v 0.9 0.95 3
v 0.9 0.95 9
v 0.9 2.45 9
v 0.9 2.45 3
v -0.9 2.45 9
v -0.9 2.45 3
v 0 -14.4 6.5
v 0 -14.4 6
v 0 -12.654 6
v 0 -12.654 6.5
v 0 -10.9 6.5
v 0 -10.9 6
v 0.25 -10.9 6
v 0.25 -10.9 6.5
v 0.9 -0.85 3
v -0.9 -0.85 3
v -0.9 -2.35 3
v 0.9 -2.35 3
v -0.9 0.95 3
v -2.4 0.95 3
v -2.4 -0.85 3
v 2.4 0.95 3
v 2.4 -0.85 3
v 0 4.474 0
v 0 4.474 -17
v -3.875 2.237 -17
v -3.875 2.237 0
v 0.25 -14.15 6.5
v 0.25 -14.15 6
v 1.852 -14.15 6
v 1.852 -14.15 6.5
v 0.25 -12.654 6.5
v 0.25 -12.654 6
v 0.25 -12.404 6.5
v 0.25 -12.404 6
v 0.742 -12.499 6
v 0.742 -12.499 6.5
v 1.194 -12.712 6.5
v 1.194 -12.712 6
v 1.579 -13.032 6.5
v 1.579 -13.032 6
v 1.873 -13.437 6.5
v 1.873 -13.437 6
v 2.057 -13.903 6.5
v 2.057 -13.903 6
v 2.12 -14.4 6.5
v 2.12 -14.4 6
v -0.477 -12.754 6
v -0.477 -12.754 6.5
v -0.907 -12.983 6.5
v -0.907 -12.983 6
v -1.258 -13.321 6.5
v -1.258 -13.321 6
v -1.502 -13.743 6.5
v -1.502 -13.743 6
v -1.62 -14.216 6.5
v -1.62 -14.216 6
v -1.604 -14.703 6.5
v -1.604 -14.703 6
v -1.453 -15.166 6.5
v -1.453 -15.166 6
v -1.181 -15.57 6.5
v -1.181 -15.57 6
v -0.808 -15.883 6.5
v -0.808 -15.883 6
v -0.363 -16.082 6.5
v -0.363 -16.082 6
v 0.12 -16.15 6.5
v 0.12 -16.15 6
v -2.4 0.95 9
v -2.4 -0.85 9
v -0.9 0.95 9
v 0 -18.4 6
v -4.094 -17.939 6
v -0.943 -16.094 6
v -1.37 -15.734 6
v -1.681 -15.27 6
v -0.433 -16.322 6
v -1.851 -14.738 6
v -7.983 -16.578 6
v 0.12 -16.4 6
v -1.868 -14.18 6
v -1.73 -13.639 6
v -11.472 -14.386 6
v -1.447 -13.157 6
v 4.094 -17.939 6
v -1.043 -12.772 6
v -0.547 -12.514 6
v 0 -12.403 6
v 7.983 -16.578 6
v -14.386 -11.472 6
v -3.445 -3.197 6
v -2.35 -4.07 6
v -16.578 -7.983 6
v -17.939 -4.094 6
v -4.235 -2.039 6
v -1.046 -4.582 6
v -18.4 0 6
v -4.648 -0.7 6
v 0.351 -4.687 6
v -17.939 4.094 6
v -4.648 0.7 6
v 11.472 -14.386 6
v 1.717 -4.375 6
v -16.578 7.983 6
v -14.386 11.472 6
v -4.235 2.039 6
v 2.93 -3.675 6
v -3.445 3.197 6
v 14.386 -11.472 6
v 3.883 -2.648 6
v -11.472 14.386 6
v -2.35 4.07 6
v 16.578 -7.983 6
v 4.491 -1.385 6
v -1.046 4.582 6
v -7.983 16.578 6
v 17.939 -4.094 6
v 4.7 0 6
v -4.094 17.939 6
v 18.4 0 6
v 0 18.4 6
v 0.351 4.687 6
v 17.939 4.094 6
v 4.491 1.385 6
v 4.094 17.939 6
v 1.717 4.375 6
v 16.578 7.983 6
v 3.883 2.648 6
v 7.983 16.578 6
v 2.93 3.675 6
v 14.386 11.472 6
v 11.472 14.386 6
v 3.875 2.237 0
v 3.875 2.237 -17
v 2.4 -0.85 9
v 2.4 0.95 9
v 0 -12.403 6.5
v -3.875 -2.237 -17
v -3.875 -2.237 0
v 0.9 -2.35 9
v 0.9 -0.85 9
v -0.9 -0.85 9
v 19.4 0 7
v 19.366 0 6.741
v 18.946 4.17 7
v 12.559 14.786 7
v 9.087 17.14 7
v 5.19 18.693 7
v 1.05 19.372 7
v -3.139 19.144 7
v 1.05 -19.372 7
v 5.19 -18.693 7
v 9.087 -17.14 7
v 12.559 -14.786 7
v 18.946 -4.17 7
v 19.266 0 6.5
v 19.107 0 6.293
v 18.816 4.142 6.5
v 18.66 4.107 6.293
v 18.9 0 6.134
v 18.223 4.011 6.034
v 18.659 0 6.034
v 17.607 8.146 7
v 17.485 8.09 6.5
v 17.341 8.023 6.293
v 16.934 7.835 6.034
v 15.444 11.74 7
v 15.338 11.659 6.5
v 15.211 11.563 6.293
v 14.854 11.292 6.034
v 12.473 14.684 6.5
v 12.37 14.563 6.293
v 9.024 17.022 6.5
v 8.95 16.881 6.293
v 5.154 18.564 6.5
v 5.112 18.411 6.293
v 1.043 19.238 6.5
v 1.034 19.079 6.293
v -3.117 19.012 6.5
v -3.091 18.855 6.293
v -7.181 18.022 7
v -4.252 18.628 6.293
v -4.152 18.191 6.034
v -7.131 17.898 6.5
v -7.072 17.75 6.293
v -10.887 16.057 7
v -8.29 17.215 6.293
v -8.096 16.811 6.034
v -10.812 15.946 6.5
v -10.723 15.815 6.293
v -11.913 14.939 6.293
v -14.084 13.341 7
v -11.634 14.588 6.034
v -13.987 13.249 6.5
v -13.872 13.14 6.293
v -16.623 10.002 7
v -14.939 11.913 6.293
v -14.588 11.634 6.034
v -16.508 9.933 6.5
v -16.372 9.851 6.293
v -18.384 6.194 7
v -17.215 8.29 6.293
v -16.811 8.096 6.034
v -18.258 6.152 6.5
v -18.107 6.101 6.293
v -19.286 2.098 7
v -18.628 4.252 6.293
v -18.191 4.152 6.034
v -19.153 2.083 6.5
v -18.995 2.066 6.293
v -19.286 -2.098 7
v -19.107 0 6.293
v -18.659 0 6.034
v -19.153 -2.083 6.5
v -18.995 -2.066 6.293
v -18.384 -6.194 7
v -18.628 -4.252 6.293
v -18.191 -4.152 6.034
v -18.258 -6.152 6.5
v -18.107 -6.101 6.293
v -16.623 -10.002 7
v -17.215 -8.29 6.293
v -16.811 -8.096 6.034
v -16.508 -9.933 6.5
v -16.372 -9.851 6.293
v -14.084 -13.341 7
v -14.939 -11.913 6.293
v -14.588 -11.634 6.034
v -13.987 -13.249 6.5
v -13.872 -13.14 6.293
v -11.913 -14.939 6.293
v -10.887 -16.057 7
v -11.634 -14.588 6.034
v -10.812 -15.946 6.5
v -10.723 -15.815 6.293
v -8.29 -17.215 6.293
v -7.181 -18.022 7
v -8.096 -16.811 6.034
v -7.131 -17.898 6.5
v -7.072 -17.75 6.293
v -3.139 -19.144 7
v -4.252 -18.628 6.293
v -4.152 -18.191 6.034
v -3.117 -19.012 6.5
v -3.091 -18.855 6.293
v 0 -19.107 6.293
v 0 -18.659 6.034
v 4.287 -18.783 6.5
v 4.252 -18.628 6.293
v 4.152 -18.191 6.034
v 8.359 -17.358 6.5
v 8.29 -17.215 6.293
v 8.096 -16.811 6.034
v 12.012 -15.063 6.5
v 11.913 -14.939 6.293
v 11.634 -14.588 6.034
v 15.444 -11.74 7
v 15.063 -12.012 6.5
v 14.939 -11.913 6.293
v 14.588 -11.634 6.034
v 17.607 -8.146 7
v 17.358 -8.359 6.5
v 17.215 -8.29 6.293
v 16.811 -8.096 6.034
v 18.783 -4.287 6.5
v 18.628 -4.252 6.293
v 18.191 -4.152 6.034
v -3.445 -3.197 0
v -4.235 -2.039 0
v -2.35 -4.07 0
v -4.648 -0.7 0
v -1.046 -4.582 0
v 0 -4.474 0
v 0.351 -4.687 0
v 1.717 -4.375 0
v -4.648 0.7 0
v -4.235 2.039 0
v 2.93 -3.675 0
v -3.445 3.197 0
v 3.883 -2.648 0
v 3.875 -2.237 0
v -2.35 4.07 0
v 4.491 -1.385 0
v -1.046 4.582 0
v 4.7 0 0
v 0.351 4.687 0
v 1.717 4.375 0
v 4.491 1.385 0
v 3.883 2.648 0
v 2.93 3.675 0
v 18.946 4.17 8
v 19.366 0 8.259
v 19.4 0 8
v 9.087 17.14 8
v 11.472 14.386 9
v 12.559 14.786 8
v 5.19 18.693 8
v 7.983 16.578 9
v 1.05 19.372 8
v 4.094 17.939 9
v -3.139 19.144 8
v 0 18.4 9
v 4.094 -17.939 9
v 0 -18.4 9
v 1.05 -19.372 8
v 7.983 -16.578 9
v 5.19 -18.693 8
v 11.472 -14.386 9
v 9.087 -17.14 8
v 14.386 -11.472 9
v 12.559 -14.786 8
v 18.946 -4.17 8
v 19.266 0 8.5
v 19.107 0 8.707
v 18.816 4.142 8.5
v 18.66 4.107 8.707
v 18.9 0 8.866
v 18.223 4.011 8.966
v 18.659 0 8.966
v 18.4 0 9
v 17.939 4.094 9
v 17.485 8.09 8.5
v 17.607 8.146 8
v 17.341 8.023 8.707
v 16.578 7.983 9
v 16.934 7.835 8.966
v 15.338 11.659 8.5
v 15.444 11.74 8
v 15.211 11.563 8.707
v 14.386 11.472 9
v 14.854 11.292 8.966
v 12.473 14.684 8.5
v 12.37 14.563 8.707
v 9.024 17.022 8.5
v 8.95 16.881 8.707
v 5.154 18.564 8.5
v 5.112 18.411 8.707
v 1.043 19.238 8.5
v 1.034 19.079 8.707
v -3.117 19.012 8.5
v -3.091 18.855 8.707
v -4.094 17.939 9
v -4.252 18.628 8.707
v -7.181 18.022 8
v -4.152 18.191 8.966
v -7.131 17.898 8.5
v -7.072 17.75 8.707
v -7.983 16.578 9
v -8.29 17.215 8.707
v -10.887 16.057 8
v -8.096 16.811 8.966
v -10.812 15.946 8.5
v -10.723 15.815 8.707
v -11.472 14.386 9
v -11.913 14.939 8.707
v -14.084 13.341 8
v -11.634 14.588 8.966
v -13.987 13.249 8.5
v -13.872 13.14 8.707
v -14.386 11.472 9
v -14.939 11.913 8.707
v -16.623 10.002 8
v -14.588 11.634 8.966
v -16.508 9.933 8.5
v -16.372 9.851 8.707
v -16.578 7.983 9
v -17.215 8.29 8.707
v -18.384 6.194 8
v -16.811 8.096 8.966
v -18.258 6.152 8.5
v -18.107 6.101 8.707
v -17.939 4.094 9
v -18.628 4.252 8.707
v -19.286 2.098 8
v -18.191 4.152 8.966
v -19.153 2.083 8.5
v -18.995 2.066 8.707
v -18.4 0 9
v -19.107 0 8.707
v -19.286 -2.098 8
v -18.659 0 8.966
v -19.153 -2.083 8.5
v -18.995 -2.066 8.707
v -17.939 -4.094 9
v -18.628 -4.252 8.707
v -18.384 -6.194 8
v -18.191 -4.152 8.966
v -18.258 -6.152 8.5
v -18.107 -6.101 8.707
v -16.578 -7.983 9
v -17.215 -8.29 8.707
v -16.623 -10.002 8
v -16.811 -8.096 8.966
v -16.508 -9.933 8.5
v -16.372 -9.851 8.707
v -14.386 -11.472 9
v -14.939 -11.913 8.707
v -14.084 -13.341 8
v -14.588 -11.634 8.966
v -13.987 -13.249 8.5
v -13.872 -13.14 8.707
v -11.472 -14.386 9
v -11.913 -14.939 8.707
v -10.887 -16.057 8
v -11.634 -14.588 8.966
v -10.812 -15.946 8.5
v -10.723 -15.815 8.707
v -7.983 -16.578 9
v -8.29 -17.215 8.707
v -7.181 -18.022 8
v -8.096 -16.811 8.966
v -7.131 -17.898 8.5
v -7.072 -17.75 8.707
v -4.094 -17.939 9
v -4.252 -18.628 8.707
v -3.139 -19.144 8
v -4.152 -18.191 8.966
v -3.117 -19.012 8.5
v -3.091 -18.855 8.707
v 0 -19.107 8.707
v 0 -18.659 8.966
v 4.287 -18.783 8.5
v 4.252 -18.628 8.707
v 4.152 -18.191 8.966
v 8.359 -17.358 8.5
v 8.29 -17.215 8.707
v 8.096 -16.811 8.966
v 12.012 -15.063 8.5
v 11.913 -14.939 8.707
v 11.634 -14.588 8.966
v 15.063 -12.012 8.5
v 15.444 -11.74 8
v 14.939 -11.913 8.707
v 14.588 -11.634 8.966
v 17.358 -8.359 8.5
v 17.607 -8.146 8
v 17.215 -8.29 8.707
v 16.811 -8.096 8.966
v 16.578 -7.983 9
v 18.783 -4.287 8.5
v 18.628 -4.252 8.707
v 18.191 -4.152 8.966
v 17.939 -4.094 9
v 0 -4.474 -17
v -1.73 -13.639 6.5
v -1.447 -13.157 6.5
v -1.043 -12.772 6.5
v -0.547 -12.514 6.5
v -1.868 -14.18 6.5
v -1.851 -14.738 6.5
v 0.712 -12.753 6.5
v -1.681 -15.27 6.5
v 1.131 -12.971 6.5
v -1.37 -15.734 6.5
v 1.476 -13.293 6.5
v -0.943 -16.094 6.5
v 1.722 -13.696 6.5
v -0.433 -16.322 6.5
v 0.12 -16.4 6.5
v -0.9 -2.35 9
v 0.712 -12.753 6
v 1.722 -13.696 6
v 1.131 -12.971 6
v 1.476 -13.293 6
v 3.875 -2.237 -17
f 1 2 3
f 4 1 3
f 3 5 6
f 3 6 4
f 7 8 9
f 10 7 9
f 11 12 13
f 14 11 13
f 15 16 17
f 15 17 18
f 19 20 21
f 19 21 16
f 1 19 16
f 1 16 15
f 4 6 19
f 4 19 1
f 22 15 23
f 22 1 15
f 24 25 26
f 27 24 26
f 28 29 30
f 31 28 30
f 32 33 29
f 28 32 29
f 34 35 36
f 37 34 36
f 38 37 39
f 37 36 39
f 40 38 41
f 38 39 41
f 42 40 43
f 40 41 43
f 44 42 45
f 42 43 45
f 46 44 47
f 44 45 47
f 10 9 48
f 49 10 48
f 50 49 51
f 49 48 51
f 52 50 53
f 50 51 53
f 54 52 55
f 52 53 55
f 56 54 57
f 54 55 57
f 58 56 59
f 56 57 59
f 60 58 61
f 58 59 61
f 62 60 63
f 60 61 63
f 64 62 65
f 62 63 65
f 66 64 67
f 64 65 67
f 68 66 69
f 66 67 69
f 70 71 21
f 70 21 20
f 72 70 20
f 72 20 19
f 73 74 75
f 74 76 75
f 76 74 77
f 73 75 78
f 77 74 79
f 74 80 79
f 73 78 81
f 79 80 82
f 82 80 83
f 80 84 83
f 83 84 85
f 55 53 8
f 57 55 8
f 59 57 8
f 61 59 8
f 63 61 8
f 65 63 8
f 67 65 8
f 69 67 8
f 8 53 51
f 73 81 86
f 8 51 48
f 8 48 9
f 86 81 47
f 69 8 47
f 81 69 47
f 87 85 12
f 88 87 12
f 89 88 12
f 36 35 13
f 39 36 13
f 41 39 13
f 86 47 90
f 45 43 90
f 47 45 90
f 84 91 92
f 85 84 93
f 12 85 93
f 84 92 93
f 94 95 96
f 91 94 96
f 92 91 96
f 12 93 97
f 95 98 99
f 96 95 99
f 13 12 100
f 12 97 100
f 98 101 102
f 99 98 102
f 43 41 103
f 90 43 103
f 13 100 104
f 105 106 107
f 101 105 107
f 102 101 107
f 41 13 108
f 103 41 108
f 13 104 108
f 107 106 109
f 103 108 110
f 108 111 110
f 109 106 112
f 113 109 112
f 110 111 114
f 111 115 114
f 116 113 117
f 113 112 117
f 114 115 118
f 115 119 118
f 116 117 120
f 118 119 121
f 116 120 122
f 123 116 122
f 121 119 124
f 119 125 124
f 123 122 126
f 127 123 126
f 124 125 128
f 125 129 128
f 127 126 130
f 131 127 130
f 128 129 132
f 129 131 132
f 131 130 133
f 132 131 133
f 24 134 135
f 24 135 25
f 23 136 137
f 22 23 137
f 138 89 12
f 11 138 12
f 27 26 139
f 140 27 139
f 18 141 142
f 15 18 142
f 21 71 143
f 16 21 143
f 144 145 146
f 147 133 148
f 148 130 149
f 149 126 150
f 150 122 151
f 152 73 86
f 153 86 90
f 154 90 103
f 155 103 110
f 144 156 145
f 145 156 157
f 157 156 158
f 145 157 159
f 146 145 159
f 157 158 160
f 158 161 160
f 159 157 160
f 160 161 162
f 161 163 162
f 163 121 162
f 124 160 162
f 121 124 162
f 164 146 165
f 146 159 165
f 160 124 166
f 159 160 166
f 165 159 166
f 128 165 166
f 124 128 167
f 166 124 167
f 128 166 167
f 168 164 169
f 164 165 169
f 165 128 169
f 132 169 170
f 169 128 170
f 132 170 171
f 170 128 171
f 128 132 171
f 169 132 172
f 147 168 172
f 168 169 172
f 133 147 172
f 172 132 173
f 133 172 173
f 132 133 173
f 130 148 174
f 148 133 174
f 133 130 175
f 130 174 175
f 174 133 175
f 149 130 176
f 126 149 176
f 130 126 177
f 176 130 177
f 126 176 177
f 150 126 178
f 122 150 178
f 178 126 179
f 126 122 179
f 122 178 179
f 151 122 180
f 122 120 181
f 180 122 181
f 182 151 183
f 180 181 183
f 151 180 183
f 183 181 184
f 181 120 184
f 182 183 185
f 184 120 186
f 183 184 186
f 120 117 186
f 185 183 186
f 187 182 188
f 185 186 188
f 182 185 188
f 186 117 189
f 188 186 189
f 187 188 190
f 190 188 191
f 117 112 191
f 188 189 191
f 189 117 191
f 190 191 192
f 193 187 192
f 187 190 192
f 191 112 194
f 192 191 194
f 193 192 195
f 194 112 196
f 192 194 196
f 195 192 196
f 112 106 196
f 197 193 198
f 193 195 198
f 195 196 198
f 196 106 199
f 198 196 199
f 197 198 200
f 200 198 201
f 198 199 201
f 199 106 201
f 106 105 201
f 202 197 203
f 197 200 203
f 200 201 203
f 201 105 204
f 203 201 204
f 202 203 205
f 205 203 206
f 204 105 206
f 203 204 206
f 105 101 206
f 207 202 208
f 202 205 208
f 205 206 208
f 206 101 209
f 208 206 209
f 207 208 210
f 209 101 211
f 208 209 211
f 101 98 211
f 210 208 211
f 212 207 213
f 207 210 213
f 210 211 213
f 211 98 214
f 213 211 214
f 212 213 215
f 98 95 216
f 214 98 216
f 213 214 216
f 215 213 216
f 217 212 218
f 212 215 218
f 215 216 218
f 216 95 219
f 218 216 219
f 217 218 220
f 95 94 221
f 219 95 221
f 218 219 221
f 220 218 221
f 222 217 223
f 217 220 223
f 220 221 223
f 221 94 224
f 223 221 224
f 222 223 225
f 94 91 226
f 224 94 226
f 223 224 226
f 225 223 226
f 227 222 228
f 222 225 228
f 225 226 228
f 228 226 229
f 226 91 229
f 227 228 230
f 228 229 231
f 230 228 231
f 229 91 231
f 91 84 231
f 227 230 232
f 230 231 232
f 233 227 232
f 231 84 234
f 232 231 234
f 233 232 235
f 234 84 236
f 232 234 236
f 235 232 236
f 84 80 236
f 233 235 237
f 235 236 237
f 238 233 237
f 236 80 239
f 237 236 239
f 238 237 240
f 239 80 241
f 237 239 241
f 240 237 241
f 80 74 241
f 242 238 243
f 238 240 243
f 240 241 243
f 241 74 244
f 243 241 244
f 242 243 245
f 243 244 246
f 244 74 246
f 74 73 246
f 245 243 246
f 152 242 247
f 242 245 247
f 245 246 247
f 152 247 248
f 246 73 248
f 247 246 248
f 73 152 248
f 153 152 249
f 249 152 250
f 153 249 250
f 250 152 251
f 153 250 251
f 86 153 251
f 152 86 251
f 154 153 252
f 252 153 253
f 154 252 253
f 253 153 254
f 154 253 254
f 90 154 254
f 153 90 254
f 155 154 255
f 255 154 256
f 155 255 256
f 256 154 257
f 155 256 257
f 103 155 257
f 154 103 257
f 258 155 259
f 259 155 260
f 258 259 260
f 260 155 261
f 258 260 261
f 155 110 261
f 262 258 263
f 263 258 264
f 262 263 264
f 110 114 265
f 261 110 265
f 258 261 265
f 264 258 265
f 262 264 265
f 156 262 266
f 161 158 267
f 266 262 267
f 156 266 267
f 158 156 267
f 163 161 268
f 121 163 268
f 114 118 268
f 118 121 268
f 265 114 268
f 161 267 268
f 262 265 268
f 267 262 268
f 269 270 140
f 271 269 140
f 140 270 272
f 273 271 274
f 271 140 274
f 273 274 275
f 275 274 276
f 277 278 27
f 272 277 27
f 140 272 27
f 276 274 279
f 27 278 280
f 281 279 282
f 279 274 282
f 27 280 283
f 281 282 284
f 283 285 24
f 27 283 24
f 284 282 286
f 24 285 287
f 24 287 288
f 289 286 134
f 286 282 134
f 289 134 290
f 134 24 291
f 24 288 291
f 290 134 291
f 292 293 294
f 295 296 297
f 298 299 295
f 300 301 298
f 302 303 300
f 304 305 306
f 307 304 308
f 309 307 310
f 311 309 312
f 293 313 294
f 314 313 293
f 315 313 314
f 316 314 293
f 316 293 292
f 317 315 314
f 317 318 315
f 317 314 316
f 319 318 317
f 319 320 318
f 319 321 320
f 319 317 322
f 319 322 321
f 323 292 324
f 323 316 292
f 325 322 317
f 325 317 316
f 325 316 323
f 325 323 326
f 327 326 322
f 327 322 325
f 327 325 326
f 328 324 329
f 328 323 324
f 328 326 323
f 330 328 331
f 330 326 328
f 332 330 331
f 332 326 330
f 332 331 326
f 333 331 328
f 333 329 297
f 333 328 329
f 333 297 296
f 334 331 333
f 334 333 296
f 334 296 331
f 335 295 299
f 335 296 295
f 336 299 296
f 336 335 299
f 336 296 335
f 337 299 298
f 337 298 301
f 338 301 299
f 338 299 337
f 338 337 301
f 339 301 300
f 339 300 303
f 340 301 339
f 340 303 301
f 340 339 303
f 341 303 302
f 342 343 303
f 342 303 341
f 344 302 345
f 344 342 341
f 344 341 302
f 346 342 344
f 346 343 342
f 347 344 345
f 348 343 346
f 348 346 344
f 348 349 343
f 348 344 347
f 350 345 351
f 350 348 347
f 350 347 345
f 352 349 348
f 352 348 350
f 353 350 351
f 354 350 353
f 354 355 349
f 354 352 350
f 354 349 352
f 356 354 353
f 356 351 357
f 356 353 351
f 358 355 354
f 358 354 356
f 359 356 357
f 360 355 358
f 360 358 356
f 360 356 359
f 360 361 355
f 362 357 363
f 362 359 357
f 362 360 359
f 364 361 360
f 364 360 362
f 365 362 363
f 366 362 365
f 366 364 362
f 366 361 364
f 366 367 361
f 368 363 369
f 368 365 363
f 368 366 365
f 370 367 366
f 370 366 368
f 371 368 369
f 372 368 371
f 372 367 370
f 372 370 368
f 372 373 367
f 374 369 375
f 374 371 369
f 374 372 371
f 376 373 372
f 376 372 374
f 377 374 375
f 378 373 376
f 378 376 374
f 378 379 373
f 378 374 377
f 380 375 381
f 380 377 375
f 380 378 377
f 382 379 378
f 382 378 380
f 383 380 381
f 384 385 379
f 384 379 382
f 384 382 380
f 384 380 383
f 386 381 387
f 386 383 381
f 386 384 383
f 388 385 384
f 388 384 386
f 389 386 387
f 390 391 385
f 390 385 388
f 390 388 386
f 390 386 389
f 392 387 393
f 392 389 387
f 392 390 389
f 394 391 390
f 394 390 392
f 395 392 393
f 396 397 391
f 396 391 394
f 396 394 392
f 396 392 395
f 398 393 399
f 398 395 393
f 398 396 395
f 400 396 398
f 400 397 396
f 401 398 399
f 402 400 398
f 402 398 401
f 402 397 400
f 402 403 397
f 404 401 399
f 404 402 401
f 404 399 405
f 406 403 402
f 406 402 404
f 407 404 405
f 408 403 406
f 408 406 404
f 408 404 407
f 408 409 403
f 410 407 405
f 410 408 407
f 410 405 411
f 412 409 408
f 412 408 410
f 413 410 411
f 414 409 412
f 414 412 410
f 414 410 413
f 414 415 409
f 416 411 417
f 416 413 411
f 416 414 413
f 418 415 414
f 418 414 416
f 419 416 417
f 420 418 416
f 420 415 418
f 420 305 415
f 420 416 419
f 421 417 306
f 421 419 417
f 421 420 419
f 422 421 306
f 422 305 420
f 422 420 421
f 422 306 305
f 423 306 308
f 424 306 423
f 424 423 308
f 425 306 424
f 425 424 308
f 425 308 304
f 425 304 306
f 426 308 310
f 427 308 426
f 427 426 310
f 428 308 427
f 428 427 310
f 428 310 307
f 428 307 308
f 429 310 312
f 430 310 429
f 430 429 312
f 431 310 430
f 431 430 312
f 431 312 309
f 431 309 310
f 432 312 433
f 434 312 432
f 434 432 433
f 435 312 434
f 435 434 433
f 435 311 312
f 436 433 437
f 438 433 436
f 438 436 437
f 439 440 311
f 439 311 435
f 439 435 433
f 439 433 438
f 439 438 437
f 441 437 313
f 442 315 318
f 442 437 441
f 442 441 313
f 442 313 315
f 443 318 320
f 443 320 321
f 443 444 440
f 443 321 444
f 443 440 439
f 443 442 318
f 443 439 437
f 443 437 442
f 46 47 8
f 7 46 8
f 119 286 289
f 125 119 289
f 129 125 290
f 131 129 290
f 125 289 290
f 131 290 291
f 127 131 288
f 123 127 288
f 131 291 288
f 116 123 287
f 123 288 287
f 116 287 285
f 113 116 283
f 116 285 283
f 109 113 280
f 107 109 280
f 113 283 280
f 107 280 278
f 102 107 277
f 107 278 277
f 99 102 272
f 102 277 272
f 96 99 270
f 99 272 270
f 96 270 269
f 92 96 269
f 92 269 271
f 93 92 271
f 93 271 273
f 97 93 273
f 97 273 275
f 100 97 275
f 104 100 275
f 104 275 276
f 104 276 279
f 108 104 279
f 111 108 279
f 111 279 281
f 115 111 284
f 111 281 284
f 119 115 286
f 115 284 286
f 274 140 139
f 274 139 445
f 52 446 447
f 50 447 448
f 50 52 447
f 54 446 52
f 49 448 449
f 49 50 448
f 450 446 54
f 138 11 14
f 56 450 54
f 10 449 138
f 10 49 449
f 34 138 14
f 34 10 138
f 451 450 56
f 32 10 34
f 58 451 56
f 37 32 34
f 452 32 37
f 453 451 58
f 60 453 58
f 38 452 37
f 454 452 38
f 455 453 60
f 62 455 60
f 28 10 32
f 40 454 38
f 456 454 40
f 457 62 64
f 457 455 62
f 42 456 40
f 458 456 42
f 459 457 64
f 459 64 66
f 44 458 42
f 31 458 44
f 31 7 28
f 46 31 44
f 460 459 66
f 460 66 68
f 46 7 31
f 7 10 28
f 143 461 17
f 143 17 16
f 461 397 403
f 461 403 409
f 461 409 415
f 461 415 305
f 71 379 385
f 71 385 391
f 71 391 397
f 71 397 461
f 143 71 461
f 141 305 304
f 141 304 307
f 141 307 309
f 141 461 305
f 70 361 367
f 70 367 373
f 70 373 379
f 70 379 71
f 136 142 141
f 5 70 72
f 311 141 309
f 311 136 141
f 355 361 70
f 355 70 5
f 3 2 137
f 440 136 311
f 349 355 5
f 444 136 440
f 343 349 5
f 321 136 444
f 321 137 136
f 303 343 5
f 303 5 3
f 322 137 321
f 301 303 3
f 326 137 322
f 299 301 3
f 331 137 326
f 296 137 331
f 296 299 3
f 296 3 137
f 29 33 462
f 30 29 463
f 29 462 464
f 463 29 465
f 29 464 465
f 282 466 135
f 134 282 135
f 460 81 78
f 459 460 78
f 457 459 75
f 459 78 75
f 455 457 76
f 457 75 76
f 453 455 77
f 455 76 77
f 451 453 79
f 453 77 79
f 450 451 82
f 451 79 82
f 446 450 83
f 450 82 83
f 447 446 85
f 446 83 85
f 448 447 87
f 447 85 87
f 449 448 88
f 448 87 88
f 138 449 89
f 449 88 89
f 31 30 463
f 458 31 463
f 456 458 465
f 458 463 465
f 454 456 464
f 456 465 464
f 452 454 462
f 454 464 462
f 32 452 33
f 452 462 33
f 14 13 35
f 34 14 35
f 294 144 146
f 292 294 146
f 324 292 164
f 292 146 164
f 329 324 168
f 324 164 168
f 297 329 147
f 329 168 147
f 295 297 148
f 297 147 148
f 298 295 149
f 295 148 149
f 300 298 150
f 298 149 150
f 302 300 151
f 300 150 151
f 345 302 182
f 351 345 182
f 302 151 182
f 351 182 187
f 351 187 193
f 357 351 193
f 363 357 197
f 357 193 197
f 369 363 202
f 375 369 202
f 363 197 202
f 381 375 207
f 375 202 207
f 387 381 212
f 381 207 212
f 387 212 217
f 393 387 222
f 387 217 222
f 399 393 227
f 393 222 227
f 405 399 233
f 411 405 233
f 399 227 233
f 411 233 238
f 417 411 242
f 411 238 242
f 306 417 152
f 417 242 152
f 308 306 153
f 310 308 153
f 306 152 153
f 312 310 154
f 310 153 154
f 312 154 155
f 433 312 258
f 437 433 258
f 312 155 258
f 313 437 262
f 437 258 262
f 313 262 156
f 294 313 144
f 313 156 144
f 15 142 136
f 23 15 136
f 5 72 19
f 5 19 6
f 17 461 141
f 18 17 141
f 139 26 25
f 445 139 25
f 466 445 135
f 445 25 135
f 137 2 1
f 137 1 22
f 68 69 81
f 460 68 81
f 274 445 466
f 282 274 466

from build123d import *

# Parameters (mm, degrees)
F1_DEPTH  = 17
F2_R      = 4.7
F3_DEPTH  = 6
F4_R      = 19.4
F5_DEPTH  = 3
F6_R      = 1
F7_W      = 1.5
F7_H      = 1.8
F7_W_2    = 1.8
F7_H_2    = 1.5
F8_DEPTH  = 6
F10_DEPTH = 0.5


with BuildPart() as f1:
    # F0 (on Top) → F1 (new body)
    with BuildSketch(Plane.XY):
        Polygon((3.875, -2.2372322931), (3.875, 2.2372322931), (0, 4.4744645862), (-3.875, 2.2372322931), (-3.875, -2.2372322931), (0, -4.4744645862), align=None)
    extrude(amount=-F1_DEPTH)

    # F2 (on face) → F3 (join)
    with BuildSketch(Plane.XY):
        Circle(F2_R)
    extrude(amount=F3_DEPTH)

    # F4 (on face) → F5 (join)
    with BuildSketch(Plane.XY.offset(6)):
        Circle(F4_R)
    extrude(amount=F5_DEPTH)

    # F6
    f6_edges = [f1.edges().sort_by_distance(p)[0] for p in [
        (-19.4, 0, 6),
        (-19.4, 0, 9),
    ]]
    fillet(f6_edges, radius=F6_R)

    # F7 (on face) → F8 (cut)
    with BuildSketch(Plane.XY.offset(9)):
        with Locations((-1.65, 0.05)):
            Rectangle(F7_W, F7_H)
        with Locations((0, 1.7)):
            Rectangle(F7_W_2, F7_H_2)
        with Locations((0, 0.05)):
            Rectangle(F7_W_2, F7_H)
        with Locations((1.65, 0.05)):
            Rectangle(F7_W, F7_H)
        with Locations((0, -1.6)):
            Rectangle(F7_W_2, F7_H_2)
    extrude(amount=-F8_DEPTH, mode=Mode.SUBTRACT)

    # F9 (on face) → F10 (cut)
    with BuildSketch(Plane(origin=(0, 0, 6), x_dir=(1, 0, 0), z_dir=(0, 0, -1))):
        with BuildLine():
            Line((0.12, 16.1495609697), (0.12, 16.3995609697))
            ThreePointArc((0.12, 16.3995609697), (-1.8790989856, 14.4595880123), (0, 12.4031642156))
            Line((0, 12.4031642156), (0, 12.6536801032))
            ThreePointArc((0, 12.6536801032), (-1.6289699135, 14.4595963078), (0.12, 16.1495609697))
        make_face()
        with BuildLine():
            Line((0, 12.6536801032), (0, 12.4031642156))
            ThreePointArc((0, 12.4031642156), (0.1250097944, 12.3995672443), (0.25, 12.4037904418))
            Line((0.25, 12.4037904418), (0.25, 12.6543962211))
            ThreePointArc((0.25, 12.6543962211), (0.1250128042, 12.6495681492), (0, 12.6536801032))
        make_face()
        with BuildLine():
            ThreePointArc((0.25, 12.4037904418), (0.1250097944, 12.3995672443), (0, 12.4031642156))
            Line((0, 12.4031642156), (0, 10.8995609697))
            Line((0, 10.8995609697), (0.25, 10.8995609697))
            Line((0.25, 10.8995609697), (0.25, 12.4037904418))
        make_face()
        with BuildLine():
            Line((0.25, 12.6543962211), (0.25, 12.4037904418))
            ThreePointArc((0.25, 12.4037904418), (1.5794519519, 13.0320815366), (2.12, 14.3995609697))
            Line((2.12, 14.3995609697), (1.87, 14.3995609697))
            ThreePointArc((1.87, 14.3995609697), (1.865506934, 14.2742392103), (1.8520508076, 14.1495609697))
            ThreePointArc((1.8520508076, 14.1495609697), (1.3140216535, 13.1201813189), (0.25, 12.6543962211))
        make_face()
        with BuildLine():
            Line((0, 14.3995609697), (0, 12.6536801032))
            ThreePointArc((0, 12.6536801032), (0.1250128042, 12.6495681492), (0.25, 12.6543962211))
            Line((0.25, 12.6543962211), (0.25, 14.1495609697))
            Line((0.25, 14.1495609697), (1.8520508076, 14.1495609697))
            ThreePointArc((1.8520508076, 14.1495609697), (1.865506934, 14.2742392103), (1.87, 14.3995609697))
            Line((1.87, 14.3995609697), (0, 14.3995609697))
        make_face()
    extrude(amount=-F10_DEPTH, mode=Mode.SUBTRACT)


solid = f1.part
